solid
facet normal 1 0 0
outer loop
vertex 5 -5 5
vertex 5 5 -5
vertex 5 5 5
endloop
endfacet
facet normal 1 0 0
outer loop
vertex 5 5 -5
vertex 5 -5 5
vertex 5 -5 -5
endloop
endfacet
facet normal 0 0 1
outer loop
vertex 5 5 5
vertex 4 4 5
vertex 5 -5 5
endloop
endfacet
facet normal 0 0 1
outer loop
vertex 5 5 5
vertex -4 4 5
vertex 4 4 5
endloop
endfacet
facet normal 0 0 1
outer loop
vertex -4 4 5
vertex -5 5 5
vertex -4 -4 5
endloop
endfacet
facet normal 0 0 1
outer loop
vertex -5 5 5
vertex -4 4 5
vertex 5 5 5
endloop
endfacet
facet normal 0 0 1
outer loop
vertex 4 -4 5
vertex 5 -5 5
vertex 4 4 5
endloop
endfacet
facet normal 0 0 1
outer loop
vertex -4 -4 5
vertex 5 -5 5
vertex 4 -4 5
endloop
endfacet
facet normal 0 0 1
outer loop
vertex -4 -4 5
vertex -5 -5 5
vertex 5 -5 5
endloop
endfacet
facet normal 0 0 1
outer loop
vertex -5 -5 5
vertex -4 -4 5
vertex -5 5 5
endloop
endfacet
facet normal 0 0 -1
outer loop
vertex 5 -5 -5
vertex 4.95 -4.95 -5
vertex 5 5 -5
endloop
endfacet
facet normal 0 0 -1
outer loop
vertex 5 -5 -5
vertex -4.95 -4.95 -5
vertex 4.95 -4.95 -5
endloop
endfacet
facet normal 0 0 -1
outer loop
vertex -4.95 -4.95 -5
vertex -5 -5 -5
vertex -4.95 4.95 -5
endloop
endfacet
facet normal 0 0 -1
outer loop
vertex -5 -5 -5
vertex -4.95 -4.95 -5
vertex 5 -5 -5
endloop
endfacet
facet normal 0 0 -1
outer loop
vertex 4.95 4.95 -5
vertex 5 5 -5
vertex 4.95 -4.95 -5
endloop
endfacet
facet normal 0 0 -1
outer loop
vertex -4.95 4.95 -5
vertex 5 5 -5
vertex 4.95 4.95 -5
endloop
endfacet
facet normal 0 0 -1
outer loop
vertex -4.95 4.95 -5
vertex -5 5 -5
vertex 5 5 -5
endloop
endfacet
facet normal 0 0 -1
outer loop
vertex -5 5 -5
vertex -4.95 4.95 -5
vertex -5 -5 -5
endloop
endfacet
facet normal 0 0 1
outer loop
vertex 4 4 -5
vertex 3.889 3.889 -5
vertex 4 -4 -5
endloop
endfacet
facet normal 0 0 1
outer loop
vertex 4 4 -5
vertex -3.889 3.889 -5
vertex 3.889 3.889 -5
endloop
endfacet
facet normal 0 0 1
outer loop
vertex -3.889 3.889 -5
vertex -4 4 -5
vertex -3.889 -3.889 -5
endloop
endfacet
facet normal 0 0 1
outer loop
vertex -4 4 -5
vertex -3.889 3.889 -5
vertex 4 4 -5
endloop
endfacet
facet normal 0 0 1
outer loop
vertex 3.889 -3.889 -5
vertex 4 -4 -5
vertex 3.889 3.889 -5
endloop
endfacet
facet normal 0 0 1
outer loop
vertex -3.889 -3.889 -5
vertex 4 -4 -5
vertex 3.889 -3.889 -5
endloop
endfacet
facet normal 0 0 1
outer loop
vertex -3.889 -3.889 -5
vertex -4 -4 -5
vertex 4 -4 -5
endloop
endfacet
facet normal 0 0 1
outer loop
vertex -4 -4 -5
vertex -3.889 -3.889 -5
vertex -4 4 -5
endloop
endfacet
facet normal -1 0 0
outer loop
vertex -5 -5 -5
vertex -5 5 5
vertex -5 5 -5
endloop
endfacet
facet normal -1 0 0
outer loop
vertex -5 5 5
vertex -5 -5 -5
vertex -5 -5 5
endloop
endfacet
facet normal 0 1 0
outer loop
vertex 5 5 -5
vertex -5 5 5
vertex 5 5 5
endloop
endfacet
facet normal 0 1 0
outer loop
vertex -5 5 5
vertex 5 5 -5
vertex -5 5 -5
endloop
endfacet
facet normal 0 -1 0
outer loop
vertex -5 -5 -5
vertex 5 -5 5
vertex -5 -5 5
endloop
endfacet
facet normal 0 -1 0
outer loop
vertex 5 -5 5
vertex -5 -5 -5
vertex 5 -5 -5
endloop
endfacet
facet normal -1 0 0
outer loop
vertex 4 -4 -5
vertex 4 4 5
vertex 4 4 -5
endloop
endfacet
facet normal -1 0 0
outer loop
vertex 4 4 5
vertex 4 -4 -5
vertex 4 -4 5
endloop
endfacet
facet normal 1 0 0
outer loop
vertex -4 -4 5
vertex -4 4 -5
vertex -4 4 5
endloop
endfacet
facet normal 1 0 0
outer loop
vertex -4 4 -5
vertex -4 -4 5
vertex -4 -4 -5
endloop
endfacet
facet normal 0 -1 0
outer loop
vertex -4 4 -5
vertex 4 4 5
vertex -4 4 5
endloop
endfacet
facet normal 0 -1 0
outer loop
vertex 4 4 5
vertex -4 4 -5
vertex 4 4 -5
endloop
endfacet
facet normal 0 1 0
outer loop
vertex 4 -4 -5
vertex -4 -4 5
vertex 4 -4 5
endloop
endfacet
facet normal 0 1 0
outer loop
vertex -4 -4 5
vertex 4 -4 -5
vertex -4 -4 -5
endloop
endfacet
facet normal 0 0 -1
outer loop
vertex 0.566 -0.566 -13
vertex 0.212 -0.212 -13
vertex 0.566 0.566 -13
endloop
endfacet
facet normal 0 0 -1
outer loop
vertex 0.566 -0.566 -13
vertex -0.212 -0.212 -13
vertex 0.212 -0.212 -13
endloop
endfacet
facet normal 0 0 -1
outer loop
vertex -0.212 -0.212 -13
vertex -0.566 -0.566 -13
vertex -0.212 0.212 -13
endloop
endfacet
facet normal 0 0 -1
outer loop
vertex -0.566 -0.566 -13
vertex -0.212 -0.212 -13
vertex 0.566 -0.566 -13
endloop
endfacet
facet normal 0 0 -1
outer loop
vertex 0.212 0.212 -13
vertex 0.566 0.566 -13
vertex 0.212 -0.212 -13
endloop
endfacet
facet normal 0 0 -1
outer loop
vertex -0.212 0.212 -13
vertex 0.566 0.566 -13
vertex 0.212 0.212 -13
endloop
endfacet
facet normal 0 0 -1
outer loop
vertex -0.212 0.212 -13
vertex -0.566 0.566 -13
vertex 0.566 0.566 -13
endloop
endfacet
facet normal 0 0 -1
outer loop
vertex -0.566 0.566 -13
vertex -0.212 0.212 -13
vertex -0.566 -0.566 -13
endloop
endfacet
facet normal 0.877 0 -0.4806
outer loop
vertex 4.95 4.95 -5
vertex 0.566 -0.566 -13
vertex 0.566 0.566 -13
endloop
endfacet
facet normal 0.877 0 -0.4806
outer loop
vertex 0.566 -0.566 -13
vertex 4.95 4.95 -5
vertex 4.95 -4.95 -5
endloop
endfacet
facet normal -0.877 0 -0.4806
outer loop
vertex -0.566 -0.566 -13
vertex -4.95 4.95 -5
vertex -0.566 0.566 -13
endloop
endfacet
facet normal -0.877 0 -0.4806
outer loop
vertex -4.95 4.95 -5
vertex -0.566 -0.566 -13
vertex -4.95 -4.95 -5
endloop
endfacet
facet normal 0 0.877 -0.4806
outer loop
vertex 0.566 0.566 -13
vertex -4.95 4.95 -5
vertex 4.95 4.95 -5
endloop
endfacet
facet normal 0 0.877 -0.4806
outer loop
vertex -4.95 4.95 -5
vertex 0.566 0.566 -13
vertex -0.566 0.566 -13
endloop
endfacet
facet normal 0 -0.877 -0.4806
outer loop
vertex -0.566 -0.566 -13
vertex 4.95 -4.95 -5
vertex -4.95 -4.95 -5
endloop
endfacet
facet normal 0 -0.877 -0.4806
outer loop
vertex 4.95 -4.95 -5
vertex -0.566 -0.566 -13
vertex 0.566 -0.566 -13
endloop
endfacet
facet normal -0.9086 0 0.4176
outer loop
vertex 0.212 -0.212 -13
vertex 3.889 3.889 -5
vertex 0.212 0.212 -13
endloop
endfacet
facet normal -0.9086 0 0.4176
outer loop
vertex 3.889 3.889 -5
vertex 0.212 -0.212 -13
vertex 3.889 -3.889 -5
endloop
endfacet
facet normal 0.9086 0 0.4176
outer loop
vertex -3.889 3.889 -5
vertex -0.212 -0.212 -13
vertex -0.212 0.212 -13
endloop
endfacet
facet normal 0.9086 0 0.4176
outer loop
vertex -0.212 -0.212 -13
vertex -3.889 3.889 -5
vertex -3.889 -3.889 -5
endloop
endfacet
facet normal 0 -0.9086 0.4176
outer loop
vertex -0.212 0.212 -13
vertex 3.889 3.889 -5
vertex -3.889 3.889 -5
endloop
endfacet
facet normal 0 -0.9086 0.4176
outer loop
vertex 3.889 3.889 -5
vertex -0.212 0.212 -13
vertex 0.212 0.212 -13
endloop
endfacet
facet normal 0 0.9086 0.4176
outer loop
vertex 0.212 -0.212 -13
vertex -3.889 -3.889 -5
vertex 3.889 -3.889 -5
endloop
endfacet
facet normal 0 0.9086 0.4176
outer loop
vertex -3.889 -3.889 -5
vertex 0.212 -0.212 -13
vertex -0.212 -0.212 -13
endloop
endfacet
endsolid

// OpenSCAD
// El diametro de la bolita
diameter = 7;
// adjusted diameter (diameter + expansion)
ad = diameter + 1;
// cell thickness
t = 2;
m = t / 2;

module cell () {
  //translate([0, 0, ad - m * 3])
  difference () {
    color("blue", 0.5) cube ([ad + t, ad + t, ad + t], true);
    color("red", 0.5) cube ([ad, ad, ad * 2], true);
  }
}

module pyramid () {
  //translate([0, 0, m])
  difference () { 
    color("Green", 0.5) 
      rotate([0,180,45]) translate([0, 0, 0]) cylinder(ad, ad - m, 0.8, $fn=4);
    color("DeepPink", 0.5) 
      rotate([0,180,45]) cylinder(ad, (ad + t + m) / 2, 0.3, $fn=4);
  }
}

module puncher() {
  cell();
  translate([0, 0, - ad + t + m]) pyramid();
}

module rosario_ball() {
  color("OrangeRed", .5)
  difference() {
    sphere(d=ad, true, $fn=50);
    cylinder(r=0.5, h=10, center=true, $fn=50);
  }
}

%rosario_ball();
puncher();
